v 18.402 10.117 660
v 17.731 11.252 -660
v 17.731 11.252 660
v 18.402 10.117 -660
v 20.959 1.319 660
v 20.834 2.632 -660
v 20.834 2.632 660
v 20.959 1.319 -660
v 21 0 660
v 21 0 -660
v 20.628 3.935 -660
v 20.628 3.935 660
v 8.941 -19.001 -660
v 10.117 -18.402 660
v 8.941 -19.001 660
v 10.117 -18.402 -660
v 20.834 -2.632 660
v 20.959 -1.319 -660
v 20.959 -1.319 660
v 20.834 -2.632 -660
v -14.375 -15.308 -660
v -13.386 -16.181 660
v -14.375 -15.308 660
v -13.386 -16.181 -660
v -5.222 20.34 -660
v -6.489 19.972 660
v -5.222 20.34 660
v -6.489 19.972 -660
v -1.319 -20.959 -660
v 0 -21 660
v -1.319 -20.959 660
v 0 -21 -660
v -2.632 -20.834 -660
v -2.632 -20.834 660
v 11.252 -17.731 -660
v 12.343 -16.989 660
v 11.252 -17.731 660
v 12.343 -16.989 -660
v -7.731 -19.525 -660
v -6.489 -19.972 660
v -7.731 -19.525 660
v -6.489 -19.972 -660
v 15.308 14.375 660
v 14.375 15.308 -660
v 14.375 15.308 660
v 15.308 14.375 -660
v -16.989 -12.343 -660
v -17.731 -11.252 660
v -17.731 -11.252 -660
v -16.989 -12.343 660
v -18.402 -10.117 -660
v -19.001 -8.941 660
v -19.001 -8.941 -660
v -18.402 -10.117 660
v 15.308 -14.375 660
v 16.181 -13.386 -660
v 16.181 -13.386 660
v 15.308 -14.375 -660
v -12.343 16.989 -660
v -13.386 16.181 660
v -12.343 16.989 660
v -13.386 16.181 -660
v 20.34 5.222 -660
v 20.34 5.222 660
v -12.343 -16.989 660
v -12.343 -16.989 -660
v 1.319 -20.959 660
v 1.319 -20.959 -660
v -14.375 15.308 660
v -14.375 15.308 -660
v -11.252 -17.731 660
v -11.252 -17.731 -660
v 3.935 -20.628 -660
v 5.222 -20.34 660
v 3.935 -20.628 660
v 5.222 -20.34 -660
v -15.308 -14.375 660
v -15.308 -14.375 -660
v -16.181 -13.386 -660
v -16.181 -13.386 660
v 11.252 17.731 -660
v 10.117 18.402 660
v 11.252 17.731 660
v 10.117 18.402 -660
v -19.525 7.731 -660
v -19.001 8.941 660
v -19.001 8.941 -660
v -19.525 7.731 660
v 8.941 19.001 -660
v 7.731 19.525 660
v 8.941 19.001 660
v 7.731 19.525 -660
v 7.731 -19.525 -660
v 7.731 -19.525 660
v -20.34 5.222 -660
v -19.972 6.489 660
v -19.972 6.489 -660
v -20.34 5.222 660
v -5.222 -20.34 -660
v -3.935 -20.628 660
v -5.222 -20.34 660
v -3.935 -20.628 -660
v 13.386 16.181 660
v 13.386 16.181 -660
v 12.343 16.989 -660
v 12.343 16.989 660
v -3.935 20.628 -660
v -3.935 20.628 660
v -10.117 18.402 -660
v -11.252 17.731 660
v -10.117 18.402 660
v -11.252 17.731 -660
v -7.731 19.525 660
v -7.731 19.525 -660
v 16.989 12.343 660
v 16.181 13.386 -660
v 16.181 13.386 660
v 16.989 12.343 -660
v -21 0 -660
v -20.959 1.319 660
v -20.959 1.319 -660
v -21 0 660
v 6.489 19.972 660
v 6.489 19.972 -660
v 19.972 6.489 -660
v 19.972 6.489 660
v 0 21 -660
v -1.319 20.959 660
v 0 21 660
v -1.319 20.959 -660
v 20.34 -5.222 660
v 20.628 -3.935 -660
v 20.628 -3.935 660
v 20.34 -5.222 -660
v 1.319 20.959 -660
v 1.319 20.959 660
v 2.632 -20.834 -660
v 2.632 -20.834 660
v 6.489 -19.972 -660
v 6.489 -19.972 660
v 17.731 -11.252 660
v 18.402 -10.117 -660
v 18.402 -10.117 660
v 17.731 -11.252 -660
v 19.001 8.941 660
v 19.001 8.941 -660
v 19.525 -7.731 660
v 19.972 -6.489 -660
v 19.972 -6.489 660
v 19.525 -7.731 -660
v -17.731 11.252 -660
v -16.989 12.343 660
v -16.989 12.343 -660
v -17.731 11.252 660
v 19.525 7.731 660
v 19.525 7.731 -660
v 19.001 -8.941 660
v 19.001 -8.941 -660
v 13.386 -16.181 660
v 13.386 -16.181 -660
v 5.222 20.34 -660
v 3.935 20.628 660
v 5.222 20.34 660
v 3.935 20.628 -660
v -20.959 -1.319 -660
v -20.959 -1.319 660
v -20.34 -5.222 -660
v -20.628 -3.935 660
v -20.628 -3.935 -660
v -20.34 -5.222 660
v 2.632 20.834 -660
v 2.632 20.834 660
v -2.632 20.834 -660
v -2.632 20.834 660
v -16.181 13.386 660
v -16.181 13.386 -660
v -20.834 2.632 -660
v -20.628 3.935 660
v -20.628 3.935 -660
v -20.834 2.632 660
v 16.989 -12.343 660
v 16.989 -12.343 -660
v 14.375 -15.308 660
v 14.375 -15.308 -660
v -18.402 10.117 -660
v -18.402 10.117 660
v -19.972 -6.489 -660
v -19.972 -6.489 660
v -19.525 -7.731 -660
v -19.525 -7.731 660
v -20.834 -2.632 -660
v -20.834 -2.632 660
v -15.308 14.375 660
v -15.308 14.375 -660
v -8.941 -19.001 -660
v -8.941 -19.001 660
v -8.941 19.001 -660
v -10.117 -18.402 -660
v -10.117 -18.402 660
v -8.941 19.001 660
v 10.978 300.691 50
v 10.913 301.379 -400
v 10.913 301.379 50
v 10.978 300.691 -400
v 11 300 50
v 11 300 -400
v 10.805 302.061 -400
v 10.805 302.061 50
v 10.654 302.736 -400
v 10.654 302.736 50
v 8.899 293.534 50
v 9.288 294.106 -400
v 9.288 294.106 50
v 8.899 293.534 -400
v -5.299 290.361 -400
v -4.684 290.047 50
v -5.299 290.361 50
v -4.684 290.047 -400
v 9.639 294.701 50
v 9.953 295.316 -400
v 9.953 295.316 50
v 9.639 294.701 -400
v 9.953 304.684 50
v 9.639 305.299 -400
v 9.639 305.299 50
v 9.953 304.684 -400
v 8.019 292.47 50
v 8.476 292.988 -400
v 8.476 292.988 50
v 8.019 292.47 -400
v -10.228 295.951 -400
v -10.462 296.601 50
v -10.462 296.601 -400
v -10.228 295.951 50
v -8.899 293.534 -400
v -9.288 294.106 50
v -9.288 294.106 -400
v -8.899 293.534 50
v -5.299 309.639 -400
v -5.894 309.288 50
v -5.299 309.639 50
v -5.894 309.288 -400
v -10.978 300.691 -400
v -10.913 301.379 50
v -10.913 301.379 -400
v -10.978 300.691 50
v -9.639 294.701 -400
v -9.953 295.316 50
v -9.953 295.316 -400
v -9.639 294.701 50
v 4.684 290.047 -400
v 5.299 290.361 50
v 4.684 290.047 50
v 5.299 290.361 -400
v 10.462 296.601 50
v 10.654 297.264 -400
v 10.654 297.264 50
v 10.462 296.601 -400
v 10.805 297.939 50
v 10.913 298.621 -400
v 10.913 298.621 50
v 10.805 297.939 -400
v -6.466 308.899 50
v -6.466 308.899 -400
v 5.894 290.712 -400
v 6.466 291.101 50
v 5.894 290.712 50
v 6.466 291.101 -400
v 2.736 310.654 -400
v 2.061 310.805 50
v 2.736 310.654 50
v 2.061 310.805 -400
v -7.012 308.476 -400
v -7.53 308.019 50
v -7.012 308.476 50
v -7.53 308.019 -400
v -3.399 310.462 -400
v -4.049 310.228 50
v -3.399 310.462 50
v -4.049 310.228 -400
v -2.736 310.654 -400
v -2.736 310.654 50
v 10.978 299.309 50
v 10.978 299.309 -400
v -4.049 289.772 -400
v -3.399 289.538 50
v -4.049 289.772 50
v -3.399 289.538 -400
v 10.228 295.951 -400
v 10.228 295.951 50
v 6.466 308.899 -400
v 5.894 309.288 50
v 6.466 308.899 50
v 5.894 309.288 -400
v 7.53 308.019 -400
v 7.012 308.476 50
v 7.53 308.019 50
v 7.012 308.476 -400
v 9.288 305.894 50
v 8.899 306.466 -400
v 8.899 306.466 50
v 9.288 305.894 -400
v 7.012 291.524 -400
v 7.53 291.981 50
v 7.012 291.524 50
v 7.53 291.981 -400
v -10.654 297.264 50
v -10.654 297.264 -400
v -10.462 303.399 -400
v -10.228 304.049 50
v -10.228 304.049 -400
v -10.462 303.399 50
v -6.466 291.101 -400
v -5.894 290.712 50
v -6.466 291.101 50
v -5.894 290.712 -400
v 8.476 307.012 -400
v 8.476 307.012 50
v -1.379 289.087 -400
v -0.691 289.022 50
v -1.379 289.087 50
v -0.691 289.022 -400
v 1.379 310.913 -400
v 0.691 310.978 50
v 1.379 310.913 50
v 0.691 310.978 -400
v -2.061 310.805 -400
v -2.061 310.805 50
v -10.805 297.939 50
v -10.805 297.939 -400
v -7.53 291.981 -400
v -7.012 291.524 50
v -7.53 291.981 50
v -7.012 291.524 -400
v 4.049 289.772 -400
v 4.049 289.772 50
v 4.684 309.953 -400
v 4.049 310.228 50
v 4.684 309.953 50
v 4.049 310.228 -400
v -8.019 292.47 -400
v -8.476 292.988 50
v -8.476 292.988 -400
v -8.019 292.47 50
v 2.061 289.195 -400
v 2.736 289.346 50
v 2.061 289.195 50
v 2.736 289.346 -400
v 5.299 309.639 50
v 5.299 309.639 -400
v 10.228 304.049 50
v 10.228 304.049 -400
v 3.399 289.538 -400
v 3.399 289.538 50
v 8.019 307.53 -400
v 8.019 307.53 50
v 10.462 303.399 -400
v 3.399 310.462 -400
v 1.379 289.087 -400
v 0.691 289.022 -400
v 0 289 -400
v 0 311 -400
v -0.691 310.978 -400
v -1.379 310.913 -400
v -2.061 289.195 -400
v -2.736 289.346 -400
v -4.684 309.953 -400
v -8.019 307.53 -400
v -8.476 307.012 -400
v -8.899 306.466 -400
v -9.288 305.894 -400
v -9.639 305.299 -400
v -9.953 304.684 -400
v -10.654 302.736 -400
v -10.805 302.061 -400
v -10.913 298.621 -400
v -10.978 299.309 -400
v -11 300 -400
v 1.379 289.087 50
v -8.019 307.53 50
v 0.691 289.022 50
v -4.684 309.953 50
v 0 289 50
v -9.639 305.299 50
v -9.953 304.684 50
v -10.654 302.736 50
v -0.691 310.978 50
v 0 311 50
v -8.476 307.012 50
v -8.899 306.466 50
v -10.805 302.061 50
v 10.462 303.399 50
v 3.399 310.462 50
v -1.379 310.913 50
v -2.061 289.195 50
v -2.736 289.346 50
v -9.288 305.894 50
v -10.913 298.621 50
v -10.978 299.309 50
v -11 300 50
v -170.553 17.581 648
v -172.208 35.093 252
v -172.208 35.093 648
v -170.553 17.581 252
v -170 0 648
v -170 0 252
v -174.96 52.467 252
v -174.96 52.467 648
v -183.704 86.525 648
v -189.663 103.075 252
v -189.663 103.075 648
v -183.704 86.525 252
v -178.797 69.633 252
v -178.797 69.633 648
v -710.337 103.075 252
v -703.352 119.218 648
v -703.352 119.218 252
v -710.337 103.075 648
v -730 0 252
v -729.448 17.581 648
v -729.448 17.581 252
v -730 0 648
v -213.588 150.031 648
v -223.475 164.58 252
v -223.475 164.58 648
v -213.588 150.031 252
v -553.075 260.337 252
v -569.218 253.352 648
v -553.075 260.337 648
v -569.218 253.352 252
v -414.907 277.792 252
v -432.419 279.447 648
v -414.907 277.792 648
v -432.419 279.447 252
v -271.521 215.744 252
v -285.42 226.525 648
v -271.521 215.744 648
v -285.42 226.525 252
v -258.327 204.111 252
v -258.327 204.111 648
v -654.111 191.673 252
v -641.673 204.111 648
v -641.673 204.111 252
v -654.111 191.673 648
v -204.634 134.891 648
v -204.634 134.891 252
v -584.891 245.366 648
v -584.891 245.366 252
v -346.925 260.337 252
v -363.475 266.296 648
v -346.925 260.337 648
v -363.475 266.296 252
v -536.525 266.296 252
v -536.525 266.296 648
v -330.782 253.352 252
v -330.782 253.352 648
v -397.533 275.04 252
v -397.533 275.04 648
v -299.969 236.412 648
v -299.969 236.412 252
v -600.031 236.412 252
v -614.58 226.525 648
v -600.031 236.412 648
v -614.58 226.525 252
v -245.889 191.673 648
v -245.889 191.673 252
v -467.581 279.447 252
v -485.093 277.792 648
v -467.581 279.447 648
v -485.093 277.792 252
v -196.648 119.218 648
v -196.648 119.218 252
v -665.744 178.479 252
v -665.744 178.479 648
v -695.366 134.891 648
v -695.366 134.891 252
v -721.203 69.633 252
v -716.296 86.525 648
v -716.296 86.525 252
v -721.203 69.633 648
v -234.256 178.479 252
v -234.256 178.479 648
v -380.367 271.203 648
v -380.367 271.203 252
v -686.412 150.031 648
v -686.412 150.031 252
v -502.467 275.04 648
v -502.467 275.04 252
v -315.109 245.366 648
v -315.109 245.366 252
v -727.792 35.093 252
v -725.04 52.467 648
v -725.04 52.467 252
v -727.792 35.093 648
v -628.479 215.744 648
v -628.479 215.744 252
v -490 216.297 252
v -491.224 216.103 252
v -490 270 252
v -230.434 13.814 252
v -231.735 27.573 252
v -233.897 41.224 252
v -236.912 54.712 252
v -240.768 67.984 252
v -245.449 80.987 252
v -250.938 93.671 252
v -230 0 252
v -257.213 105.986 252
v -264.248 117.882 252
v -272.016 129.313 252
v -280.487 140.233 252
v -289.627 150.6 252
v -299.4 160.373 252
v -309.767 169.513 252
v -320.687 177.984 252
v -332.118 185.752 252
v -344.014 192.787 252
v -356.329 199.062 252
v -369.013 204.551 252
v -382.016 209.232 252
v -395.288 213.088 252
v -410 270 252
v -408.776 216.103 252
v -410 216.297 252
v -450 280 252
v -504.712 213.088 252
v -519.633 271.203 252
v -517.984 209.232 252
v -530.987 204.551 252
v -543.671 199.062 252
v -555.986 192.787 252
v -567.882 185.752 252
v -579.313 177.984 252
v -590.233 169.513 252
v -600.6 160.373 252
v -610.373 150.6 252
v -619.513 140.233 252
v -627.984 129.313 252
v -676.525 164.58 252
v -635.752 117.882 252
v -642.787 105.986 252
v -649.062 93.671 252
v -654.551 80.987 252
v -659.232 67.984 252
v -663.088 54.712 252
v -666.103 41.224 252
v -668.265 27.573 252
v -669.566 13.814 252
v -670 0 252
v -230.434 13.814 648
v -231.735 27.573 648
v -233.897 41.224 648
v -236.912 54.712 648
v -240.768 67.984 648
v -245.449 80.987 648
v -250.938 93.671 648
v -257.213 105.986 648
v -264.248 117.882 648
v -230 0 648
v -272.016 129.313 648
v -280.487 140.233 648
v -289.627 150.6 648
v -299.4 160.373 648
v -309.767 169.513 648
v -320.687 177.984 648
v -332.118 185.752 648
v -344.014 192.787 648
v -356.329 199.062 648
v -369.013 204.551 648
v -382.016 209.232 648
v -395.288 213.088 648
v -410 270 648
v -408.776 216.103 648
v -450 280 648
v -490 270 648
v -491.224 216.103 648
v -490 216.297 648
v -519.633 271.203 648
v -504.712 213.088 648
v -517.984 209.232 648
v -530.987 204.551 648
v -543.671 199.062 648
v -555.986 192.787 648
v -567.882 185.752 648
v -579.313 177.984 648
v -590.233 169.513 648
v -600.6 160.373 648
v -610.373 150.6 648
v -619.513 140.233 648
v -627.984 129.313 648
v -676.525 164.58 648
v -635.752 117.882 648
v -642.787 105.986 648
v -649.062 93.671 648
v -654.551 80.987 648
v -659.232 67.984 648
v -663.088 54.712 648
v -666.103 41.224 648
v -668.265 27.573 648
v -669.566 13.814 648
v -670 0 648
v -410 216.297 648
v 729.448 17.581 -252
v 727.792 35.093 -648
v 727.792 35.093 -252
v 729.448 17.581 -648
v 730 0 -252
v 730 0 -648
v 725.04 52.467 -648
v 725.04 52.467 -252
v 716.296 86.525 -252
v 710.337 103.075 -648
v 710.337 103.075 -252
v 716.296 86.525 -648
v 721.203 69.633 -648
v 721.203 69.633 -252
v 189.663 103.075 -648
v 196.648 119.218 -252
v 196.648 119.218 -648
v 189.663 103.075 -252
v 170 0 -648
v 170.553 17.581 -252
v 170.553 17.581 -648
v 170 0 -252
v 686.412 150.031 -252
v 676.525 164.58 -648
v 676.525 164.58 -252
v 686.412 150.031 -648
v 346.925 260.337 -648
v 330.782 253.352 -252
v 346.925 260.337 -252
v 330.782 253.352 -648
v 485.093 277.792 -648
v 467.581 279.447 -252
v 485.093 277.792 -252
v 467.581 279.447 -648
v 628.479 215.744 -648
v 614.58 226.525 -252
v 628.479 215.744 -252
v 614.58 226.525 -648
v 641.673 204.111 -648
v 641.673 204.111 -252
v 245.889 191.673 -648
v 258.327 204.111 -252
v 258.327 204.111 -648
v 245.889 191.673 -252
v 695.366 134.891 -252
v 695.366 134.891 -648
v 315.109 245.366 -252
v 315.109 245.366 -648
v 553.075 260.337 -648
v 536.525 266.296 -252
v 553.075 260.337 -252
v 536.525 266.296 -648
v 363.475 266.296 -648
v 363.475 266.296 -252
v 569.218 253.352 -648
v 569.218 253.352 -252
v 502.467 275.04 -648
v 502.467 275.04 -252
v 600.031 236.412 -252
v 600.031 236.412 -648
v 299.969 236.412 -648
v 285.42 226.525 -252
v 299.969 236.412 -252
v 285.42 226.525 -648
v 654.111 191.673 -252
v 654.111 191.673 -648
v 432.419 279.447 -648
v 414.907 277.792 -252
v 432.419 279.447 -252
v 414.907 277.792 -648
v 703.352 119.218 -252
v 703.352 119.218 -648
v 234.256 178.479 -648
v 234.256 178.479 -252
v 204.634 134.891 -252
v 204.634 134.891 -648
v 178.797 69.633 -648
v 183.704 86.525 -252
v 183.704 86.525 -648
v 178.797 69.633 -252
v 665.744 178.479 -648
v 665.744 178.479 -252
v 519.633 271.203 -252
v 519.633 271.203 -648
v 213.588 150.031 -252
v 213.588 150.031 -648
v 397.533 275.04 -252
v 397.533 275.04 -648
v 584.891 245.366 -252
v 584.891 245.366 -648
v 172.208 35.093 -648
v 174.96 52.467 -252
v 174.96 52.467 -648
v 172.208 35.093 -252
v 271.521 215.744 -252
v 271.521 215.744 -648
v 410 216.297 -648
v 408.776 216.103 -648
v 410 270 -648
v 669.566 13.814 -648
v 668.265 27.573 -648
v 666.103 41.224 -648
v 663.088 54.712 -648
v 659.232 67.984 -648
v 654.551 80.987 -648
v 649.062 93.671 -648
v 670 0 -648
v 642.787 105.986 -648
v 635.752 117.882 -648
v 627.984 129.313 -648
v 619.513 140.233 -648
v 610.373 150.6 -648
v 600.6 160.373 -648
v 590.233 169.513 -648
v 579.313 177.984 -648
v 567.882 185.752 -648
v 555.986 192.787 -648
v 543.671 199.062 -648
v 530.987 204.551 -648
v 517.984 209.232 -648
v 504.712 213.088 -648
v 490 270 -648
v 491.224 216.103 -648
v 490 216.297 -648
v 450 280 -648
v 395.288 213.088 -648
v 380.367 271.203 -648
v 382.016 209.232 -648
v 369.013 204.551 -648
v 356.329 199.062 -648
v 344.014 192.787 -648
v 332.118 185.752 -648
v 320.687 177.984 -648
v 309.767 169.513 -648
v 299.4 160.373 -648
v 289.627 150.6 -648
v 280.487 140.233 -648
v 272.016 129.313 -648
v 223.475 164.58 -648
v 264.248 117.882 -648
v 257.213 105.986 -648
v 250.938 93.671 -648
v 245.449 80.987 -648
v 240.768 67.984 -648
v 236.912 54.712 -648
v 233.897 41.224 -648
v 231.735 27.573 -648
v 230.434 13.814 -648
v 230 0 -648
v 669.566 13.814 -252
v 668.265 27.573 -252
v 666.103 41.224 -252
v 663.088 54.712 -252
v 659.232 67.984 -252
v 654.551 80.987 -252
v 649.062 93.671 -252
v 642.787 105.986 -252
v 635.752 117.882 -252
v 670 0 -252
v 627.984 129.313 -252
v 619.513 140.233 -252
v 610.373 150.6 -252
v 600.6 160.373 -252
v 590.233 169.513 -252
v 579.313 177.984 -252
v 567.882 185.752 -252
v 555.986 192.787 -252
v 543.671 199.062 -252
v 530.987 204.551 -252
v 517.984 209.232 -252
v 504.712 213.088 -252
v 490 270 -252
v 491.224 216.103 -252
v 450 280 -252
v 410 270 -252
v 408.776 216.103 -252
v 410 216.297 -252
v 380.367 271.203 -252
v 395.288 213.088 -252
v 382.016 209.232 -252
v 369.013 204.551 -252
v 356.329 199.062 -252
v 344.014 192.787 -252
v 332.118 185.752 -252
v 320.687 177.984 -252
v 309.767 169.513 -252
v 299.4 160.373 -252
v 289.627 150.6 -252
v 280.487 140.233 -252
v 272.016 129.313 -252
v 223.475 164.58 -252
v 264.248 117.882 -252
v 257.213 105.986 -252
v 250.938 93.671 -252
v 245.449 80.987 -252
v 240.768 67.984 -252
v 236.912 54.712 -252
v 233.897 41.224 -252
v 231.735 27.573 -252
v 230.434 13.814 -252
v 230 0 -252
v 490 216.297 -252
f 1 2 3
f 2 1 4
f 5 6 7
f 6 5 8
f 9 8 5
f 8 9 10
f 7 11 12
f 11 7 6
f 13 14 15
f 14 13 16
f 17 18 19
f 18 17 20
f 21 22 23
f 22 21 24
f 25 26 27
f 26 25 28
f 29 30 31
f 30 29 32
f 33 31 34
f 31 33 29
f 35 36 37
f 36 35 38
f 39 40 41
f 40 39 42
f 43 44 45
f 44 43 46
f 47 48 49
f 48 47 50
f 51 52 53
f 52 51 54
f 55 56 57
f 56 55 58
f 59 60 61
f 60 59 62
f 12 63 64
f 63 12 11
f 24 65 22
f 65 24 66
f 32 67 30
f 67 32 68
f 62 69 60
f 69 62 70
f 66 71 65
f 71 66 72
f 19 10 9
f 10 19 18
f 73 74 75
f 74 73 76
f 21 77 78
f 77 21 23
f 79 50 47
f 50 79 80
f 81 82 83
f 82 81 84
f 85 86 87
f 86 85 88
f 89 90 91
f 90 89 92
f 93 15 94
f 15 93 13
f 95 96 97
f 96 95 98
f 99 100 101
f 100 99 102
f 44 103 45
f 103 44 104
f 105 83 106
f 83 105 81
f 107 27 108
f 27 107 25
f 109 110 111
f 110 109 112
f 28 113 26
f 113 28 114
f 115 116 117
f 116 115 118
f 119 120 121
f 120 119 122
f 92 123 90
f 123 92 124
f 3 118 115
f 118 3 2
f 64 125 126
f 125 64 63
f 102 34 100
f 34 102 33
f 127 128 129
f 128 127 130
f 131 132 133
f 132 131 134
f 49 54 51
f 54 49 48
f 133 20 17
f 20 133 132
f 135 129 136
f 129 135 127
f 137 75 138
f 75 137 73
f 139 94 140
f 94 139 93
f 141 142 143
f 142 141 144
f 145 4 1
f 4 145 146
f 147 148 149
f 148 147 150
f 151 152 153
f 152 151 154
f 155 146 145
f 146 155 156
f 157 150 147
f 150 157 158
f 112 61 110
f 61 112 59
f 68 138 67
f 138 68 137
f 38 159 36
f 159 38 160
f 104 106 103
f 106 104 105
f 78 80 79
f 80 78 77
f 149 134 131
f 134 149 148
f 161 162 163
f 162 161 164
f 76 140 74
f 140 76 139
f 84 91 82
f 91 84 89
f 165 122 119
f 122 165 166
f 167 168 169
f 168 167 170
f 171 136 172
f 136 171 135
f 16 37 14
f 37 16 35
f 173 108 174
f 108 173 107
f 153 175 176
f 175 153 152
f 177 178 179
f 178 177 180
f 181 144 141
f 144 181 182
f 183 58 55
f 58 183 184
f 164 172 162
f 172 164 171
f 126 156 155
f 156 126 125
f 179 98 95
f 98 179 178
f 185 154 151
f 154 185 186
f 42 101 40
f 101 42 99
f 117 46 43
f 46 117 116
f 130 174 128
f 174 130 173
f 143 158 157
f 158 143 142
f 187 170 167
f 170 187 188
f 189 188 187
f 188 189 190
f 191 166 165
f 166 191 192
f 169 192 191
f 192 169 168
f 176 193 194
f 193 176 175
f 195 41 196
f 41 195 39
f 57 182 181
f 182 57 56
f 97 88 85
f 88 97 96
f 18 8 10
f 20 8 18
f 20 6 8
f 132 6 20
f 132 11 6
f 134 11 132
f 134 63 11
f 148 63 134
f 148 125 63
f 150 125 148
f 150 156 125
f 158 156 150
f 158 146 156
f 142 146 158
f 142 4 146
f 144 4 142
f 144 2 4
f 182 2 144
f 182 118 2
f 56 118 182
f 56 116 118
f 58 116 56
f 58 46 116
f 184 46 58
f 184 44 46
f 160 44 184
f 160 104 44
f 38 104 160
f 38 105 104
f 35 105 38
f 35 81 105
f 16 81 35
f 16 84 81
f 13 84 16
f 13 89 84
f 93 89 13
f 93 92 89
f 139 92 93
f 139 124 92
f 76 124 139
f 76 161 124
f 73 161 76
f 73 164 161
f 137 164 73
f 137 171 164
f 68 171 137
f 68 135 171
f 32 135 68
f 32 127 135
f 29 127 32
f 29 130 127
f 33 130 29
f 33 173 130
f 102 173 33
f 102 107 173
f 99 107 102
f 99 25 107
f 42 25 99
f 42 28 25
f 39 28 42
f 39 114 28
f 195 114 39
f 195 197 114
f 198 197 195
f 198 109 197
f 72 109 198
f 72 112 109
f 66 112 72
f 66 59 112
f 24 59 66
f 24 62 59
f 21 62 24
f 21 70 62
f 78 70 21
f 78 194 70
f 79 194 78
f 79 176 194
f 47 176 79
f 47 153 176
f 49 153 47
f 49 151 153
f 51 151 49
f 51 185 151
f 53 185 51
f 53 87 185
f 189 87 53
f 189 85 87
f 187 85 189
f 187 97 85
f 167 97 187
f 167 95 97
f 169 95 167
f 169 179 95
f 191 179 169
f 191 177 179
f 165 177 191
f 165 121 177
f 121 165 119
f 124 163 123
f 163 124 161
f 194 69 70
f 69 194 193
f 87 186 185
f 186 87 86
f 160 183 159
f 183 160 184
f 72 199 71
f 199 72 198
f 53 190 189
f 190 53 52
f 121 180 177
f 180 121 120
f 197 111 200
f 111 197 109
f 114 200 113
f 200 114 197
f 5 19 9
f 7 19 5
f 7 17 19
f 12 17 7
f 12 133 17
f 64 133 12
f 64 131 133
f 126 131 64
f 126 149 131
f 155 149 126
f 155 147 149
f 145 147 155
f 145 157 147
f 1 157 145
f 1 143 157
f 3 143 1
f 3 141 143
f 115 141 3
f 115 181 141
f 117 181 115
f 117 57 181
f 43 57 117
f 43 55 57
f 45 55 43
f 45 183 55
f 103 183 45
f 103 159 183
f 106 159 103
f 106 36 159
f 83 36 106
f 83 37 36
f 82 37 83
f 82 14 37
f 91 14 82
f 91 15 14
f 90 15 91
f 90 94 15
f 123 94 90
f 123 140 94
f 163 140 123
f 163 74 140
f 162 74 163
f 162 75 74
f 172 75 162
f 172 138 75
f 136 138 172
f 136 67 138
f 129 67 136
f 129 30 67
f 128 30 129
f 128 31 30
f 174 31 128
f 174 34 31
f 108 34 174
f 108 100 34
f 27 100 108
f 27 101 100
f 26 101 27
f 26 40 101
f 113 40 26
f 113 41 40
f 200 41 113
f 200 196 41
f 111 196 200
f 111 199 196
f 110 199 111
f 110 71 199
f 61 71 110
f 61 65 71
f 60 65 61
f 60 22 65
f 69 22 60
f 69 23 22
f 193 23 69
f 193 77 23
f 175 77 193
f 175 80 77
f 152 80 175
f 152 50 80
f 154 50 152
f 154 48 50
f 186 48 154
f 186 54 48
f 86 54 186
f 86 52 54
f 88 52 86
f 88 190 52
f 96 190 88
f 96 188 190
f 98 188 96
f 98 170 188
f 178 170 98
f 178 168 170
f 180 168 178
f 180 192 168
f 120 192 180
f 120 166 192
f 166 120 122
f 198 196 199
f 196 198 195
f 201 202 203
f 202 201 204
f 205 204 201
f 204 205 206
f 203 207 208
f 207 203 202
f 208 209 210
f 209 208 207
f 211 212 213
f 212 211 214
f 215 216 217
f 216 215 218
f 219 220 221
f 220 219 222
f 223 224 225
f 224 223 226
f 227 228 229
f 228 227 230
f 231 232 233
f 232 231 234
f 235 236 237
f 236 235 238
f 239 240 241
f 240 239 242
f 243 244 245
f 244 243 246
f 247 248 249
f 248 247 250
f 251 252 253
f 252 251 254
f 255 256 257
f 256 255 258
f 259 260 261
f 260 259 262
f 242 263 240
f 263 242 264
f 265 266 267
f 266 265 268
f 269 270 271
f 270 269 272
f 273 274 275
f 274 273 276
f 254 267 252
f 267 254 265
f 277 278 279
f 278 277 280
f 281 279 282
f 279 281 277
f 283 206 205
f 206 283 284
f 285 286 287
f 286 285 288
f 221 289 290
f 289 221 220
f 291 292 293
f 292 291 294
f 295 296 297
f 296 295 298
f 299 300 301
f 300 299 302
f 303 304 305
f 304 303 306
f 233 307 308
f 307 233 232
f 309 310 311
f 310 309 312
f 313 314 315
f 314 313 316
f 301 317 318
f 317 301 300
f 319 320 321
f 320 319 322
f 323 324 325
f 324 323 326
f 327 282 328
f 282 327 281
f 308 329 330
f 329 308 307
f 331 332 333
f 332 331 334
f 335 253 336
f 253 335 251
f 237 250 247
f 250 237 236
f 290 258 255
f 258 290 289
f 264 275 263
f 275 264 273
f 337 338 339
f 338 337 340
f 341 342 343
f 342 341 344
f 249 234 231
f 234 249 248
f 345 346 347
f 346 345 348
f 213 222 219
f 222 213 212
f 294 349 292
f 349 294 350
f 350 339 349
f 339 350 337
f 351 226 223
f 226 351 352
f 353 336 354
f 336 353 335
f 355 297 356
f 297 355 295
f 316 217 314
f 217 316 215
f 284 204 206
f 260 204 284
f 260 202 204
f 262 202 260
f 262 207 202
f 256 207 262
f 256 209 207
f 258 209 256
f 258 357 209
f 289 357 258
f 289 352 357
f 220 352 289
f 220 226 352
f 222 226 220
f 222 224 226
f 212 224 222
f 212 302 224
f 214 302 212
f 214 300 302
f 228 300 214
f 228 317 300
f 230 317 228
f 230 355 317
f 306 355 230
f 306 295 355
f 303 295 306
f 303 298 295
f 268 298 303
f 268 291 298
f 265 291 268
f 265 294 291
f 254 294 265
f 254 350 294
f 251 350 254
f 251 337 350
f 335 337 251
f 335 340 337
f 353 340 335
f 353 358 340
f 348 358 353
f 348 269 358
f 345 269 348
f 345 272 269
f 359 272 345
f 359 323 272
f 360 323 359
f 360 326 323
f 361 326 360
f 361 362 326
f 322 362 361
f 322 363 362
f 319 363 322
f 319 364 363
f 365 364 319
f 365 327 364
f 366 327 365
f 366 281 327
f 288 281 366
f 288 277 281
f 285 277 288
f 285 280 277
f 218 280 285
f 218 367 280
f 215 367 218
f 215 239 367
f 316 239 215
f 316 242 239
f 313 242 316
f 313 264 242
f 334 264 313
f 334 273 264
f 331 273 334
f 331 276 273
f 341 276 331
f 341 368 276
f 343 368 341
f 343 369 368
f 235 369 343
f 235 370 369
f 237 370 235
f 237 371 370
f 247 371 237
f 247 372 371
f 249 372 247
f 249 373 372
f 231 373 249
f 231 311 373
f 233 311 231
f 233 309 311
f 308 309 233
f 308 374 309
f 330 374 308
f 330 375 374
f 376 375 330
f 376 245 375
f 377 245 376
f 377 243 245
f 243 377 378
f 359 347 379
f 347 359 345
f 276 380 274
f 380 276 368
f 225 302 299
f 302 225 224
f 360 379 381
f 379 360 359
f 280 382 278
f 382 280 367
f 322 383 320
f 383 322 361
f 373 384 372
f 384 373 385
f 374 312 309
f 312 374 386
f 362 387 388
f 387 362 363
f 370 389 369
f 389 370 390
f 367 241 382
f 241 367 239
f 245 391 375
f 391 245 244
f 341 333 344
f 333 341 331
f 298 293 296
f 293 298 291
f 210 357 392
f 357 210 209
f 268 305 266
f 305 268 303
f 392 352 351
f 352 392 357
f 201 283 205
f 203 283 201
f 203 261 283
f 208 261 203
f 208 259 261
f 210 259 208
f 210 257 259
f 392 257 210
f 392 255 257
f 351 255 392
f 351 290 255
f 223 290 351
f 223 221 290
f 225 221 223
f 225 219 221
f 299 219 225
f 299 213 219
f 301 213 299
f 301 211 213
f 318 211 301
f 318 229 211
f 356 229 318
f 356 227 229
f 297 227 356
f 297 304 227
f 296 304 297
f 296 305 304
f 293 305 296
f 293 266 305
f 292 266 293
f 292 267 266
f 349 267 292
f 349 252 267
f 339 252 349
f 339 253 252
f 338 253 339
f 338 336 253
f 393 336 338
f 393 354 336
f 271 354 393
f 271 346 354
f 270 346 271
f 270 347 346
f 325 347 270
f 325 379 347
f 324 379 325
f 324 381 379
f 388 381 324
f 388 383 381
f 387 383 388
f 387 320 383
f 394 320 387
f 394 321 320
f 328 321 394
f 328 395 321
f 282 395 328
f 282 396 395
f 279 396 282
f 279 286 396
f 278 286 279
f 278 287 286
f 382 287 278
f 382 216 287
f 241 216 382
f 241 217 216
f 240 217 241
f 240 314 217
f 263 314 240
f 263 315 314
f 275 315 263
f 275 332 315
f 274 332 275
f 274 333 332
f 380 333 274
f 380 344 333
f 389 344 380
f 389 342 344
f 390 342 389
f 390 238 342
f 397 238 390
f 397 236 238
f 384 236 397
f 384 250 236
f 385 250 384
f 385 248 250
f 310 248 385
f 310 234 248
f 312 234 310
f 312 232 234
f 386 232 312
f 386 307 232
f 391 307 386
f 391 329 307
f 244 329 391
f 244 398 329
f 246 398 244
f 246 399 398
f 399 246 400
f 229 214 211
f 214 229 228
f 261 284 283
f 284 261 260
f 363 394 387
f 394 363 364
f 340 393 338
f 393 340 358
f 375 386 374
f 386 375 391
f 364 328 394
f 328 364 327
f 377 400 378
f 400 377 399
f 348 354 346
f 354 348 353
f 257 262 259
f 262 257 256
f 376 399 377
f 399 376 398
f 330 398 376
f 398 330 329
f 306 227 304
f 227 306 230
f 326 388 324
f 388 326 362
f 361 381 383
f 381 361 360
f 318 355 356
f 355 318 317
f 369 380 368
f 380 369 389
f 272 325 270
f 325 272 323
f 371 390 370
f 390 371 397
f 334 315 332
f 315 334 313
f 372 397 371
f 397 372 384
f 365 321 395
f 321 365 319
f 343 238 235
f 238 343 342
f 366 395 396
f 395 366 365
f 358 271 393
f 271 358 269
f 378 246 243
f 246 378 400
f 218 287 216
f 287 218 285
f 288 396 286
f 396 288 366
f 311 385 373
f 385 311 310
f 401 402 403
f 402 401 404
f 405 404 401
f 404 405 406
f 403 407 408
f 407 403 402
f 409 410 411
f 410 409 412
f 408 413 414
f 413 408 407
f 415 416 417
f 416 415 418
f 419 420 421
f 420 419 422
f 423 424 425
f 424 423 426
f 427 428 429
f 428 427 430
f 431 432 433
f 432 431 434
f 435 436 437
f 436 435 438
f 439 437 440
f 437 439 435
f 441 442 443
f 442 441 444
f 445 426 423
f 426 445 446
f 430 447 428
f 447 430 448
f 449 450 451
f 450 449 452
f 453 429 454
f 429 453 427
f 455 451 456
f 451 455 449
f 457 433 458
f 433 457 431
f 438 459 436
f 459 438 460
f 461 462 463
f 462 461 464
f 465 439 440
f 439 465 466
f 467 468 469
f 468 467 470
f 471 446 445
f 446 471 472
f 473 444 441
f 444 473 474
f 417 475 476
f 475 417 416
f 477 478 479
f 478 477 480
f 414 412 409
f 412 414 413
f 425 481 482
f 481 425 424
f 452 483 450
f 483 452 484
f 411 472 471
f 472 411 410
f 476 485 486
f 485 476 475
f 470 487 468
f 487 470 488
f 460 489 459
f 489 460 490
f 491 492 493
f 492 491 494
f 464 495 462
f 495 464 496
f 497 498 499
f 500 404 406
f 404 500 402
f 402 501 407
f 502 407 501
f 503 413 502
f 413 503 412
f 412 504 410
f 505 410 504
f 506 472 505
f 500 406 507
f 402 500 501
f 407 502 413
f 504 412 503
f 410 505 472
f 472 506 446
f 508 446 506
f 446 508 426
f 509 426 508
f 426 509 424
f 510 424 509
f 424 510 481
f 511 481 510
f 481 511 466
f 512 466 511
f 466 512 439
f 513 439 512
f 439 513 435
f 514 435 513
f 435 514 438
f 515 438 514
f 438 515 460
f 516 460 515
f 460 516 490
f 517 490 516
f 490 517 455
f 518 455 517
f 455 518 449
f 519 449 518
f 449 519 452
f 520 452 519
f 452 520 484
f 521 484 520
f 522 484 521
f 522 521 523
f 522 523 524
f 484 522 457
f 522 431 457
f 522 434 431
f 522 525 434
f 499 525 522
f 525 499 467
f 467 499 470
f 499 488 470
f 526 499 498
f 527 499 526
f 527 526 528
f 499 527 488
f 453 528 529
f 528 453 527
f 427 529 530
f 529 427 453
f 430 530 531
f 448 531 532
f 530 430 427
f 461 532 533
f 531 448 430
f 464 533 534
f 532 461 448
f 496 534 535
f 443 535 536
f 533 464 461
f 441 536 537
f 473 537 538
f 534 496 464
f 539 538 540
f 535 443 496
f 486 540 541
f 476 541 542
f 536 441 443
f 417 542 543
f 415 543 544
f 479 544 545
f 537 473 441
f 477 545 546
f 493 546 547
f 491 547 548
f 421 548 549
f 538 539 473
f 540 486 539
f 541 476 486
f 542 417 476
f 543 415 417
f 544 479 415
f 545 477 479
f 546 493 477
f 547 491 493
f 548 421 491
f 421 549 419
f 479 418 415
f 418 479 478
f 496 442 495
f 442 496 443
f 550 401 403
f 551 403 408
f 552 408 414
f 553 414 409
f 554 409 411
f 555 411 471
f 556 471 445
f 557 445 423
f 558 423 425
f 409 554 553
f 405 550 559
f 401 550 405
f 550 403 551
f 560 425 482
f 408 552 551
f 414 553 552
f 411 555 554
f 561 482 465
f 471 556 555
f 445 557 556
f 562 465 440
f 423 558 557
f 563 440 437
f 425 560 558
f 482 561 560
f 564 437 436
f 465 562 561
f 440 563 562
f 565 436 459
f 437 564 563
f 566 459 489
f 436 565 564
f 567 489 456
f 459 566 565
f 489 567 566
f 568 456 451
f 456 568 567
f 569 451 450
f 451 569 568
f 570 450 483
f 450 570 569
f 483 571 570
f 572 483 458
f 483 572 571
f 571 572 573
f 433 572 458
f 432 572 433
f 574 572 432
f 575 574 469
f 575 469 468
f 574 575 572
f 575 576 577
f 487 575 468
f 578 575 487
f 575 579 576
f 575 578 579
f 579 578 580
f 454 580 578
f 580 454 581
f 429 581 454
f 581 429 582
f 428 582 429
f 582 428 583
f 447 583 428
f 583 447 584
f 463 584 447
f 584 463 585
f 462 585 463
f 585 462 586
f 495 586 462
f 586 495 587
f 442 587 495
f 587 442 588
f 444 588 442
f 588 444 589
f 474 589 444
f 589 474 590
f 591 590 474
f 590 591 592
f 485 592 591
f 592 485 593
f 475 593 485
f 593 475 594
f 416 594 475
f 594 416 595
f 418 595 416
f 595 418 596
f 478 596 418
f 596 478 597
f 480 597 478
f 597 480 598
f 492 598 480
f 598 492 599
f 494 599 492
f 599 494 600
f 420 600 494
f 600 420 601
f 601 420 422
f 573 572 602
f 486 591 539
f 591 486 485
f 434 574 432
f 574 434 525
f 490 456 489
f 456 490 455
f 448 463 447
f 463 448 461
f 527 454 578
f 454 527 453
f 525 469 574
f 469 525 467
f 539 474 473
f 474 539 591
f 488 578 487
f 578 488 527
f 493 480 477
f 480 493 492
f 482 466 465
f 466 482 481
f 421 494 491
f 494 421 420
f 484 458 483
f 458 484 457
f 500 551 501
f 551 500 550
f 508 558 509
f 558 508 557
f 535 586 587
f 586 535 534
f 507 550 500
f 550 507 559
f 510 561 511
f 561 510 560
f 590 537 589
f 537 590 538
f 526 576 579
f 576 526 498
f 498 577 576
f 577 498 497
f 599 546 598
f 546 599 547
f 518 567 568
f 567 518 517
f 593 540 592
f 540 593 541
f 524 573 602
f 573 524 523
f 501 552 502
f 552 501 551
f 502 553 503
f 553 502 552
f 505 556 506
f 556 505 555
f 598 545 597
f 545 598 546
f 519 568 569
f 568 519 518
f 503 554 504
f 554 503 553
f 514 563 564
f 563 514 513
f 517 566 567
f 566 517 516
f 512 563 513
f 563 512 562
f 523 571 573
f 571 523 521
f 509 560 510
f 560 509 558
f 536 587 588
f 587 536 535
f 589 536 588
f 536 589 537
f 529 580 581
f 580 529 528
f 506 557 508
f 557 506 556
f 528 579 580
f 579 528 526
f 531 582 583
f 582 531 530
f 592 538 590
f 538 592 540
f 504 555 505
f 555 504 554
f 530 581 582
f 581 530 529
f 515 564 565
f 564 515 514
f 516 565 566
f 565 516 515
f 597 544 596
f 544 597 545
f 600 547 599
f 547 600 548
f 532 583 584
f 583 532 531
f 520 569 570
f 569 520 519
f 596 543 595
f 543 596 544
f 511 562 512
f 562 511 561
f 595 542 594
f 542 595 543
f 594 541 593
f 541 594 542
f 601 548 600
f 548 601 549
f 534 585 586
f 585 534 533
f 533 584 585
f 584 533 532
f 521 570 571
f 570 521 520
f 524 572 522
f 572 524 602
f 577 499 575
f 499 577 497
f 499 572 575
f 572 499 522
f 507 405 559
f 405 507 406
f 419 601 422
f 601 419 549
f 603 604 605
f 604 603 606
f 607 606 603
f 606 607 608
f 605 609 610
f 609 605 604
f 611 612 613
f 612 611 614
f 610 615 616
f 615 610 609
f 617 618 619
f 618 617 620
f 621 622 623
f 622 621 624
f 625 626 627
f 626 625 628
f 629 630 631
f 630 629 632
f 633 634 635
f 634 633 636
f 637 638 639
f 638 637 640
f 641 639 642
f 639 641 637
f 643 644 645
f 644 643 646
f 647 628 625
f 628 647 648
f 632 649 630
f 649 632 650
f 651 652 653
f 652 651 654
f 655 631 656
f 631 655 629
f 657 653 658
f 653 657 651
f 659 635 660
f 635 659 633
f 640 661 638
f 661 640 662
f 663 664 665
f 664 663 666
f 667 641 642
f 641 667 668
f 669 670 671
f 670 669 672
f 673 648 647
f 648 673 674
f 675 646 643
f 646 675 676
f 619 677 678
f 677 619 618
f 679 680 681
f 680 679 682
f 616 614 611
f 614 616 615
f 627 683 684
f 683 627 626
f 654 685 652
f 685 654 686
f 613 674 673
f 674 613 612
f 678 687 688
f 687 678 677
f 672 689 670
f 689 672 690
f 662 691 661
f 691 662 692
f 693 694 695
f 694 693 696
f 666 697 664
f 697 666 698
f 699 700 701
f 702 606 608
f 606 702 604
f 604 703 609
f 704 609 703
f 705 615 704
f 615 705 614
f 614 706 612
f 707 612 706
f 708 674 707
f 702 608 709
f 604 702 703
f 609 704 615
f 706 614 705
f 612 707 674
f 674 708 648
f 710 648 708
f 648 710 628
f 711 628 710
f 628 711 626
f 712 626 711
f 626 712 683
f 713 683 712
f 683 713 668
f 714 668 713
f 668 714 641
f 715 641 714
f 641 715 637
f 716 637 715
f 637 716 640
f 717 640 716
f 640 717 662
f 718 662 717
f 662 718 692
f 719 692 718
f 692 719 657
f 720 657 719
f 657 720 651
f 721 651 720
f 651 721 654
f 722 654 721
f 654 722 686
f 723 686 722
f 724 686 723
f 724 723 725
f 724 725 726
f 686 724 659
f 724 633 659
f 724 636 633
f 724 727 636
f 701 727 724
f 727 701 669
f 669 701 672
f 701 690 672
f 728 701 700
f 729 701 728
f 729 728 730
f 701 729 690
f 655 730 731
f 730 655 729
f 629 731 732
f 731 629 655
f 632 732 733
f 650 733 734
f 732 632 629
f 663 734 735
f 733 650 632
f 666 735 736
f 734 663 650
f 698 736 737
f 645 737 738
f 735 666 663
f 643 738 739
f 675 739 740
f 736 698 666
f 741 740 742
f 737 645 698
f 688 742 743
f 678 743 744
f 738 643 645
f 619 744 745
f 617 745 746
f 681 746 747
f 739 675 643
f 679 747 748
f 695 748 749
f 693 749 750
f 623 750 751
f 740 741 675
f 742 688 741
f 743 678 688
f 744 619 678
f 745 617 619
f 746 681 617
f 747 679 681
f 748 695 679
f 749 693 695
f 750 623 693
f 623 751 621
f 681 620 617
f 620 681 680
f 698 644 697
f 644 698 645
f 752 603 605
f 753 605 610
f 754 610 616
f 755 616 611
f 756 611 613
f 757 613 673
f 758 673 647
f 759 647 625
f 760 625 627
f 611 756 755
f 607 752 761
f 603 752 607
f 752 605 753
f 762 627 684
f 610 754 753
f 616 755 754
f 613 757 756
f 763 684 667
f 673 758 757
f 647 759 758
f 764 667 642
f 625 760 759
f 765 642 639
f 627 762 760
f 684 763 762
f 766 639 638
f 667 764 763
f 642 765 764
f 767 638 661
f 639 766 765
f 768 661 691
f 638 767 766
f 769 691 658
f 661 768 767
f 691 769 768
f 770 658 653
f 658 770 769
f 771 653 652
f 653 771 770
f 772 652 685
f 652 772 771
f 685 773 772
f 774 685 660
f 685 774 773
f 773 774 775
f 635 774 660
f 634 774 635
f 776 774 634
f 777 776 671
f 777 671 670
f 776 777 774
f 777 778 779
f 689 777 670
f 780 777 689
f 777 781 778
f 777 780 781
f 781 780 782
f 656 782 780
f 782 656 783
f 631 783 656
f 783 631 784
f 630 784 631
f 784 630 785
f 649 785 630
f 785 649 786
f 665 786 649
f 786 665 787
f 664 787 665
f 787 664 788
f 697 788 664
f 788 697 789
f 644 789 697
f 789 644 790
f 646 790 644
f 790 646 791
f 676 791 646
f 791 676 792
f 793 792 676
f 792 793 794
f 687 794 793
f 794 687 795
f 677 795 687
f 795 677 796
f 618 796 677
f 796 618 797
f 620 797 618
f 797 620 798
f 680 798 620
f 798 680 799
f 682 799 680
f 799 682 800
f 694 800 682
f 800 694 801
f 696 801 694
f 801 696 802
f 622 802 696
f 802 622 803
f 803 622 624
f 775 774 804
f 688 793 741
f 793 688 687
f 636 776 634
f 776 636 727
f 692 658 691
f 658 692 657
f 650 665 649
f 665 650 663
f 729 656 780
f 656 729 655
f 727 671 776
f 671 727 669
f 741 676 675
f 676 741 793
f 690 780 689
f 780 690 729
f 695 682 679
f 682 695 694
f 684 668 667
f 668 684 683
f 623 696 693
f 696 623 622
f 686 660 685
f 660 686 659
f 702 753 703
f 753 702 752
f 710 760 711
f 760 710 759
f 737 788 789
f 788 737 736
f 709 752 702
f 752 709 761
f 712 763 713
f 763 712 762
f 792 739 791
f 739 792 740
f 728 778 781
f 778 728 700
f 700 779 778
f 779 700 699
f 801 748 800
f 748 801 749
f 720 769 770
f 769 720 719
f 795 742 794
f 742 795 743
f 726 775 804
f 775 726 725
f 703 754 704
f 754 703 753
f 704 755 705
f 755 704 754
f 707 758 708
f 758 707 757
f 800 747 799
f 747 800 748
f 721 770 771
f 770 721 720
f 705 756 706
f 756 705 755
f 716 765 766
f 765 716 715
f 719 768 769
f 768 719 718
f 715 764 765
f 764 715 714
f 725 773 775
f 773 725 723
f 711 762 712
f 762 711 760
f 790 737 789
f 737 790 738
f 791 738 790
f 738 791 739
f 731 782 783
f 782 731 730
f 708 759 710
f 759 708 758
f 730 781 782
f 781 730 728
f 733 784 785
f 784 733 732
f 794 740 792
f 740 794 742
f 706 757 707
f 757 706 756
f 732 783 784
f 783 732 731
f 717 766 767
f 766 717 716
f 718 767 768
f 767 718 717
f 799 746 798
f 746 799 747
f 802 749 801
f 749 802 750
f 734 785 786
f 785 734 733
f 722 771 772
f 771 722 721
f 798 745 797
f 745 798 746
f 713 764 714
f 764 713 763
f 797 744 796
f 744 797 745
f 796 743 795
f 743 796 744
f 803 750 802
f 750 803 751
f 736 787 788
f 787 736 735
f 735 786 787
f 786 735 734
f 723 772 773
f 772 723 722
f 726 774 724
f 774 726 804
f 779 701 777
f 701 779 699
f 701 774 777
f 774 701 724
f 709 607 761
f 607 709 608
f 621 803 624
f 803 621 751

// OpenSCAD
// ============================================================================
// PROJECT: XXXG-00W0 WING GUNDAM ZERO EW - FLIGHT SURFACE INFRA
// COMPONENT VAULT: BANDAI CAST RUNNER W - PLUME HINGES W3 & W4
// PACKAGING RE-ARCHITECTURE: SUB-ARMOR CAPACITOR RECESSED BANK INTEGRATION
// CONFIG METRIC: SCALED TITANIUM CASTS (1:1 ACTUAL METRIC UP-SCALE)
// ============================================================================

$fn = 100; // High-precision circular resolution segment count

// Structural Constants Scaled 1:1 for a 16.7-Meter Airframe Scale (mm)
hinge_total_length = 880;                // Total longitudinal vertical height (mm)
pivot_bore_diameter = 440;               // Core cycloidal stabilizer pin width (mm)
armor_skin_thickness = 60;              // Solid TiAl protective plating wall (mm)
harness_conduit_width = 80;             // Cast-in 4oz copper logic trace track (mm)
capacitor_pocket_depth = 15;            // Sub-armor recessed housing pocket depth (mm)
capacitor_pocket_width = 140;           // Transverse MLCC array pocket width (mm)

module Runner_W_Plume_Hinge_Forge() {
    // Central Supply Injection Runner Axis (Molten Feed Line from Siphon Forge)
    color([0.22, 0.22, 0.25]) {
        cylinder(h = hinge_total_length * 1.5, d = 42, center = true);
        // Direct injection gates tracking straight into the part mold cavities
        translate() rotate() cylinder(h = 450, d = 22);
        translate([0, 300, -400]) rotate() cylinder(h = 450, d = 22);
    }
    
    // Instantiate Scaled Skeutomorphic Part Molds Symmetrically (Left & Right)
    Cast_Internal_Plume_Hinges();
}

module Cast_Internal_Plume_Hinges() {
    // ---- PART W3: INTERNAL LEFT LOWER SECONDARY WING STABILIZER HINGE ----
    translate([-450, 0, 450]) color([0.35, 0.35, 0.38]) { // Inner Frame Dark Spec
        difference() {
            // Main solid heavy-duty core joint connection block segment
            cylinder(h = hinge_total_length * 0.45, d = pivot_bore_diameter + (armor_skin_thickness * 2), center = true);
            
            // Central Cycloidal Reduction Track Bore (Houses pre-loaded alignment pins)
            cylinder(h = hinge_total_length * 0.5, d = pivot_bore_diameter, center = true);
            
            // SUB-ARMOR RECESSED CAPACITOR POCKETS [Segmented rows cut inside the armor inner wall]
            for (z_offset = [-150, 0, 150]) {
                translate([0, (pivot_bore_diameter/2 - armor_skin_thickness + capacitor_pocket_depth/2), z_offset])
                    cube([capacitor_pocket_width, capacitor_pocket_depth, 100], center = true);
            }
            
            // Continuous cast-in routing track for the 4oz solid-state wiring rails
            cube([harness_conduit_width, pivot_bore_diameter + 100, hinge_total_length], center = true);
            
            // Slicing profile tool to generate an asymmetrical half-shell part component
            translate([0, -pivot_bore_diameter, 0])
                cube([pivot_bore_diameter * 2, pivot_bore_diameter * 2, hinge_total_length * 2], center = true);
        }
    }
    
    // ---- PART W4: INTERNAL RIGHT LOWER SECONDARY WING STABILIZER HINGE ----
    translate([450, 0, -450]) rotate() color([0.35, 0.35, 0.38]) {
        difference() {
            cylinder(h = hinge_total_length * 0.45, d = pivot_bore_diameter + (armor_skin_thickness * 2), center = true);
            cylinder(h = hinge_total_length * 0.5, d = pivot_bore_diameter, center = true);
            
            for (z_offset = [-150, 0, 150]) {
                translate([0, (pivot_bore_diameter/2 - armor_skin_thickness + capacitor_pocket_depth/2), z_offset])
                    cube([capacitor_pocket_width, capacitor_pocket_depth, 100], center = true);
            }
            
            cube([harness_conduit_width, pivot_bore_diameter + 100, hinge_total_length], center = true);
            translate([0, -pivot_bore_diameter, 0])
                cube([pivot_bore_diameter * 2, pivot_bore_diameter * 2, hinge_total_length * 2], center = true);
        }
    }
}

// Render Master Assembly to Parameter Workspace
Runner_W_Plume_Hinge_Forge();
